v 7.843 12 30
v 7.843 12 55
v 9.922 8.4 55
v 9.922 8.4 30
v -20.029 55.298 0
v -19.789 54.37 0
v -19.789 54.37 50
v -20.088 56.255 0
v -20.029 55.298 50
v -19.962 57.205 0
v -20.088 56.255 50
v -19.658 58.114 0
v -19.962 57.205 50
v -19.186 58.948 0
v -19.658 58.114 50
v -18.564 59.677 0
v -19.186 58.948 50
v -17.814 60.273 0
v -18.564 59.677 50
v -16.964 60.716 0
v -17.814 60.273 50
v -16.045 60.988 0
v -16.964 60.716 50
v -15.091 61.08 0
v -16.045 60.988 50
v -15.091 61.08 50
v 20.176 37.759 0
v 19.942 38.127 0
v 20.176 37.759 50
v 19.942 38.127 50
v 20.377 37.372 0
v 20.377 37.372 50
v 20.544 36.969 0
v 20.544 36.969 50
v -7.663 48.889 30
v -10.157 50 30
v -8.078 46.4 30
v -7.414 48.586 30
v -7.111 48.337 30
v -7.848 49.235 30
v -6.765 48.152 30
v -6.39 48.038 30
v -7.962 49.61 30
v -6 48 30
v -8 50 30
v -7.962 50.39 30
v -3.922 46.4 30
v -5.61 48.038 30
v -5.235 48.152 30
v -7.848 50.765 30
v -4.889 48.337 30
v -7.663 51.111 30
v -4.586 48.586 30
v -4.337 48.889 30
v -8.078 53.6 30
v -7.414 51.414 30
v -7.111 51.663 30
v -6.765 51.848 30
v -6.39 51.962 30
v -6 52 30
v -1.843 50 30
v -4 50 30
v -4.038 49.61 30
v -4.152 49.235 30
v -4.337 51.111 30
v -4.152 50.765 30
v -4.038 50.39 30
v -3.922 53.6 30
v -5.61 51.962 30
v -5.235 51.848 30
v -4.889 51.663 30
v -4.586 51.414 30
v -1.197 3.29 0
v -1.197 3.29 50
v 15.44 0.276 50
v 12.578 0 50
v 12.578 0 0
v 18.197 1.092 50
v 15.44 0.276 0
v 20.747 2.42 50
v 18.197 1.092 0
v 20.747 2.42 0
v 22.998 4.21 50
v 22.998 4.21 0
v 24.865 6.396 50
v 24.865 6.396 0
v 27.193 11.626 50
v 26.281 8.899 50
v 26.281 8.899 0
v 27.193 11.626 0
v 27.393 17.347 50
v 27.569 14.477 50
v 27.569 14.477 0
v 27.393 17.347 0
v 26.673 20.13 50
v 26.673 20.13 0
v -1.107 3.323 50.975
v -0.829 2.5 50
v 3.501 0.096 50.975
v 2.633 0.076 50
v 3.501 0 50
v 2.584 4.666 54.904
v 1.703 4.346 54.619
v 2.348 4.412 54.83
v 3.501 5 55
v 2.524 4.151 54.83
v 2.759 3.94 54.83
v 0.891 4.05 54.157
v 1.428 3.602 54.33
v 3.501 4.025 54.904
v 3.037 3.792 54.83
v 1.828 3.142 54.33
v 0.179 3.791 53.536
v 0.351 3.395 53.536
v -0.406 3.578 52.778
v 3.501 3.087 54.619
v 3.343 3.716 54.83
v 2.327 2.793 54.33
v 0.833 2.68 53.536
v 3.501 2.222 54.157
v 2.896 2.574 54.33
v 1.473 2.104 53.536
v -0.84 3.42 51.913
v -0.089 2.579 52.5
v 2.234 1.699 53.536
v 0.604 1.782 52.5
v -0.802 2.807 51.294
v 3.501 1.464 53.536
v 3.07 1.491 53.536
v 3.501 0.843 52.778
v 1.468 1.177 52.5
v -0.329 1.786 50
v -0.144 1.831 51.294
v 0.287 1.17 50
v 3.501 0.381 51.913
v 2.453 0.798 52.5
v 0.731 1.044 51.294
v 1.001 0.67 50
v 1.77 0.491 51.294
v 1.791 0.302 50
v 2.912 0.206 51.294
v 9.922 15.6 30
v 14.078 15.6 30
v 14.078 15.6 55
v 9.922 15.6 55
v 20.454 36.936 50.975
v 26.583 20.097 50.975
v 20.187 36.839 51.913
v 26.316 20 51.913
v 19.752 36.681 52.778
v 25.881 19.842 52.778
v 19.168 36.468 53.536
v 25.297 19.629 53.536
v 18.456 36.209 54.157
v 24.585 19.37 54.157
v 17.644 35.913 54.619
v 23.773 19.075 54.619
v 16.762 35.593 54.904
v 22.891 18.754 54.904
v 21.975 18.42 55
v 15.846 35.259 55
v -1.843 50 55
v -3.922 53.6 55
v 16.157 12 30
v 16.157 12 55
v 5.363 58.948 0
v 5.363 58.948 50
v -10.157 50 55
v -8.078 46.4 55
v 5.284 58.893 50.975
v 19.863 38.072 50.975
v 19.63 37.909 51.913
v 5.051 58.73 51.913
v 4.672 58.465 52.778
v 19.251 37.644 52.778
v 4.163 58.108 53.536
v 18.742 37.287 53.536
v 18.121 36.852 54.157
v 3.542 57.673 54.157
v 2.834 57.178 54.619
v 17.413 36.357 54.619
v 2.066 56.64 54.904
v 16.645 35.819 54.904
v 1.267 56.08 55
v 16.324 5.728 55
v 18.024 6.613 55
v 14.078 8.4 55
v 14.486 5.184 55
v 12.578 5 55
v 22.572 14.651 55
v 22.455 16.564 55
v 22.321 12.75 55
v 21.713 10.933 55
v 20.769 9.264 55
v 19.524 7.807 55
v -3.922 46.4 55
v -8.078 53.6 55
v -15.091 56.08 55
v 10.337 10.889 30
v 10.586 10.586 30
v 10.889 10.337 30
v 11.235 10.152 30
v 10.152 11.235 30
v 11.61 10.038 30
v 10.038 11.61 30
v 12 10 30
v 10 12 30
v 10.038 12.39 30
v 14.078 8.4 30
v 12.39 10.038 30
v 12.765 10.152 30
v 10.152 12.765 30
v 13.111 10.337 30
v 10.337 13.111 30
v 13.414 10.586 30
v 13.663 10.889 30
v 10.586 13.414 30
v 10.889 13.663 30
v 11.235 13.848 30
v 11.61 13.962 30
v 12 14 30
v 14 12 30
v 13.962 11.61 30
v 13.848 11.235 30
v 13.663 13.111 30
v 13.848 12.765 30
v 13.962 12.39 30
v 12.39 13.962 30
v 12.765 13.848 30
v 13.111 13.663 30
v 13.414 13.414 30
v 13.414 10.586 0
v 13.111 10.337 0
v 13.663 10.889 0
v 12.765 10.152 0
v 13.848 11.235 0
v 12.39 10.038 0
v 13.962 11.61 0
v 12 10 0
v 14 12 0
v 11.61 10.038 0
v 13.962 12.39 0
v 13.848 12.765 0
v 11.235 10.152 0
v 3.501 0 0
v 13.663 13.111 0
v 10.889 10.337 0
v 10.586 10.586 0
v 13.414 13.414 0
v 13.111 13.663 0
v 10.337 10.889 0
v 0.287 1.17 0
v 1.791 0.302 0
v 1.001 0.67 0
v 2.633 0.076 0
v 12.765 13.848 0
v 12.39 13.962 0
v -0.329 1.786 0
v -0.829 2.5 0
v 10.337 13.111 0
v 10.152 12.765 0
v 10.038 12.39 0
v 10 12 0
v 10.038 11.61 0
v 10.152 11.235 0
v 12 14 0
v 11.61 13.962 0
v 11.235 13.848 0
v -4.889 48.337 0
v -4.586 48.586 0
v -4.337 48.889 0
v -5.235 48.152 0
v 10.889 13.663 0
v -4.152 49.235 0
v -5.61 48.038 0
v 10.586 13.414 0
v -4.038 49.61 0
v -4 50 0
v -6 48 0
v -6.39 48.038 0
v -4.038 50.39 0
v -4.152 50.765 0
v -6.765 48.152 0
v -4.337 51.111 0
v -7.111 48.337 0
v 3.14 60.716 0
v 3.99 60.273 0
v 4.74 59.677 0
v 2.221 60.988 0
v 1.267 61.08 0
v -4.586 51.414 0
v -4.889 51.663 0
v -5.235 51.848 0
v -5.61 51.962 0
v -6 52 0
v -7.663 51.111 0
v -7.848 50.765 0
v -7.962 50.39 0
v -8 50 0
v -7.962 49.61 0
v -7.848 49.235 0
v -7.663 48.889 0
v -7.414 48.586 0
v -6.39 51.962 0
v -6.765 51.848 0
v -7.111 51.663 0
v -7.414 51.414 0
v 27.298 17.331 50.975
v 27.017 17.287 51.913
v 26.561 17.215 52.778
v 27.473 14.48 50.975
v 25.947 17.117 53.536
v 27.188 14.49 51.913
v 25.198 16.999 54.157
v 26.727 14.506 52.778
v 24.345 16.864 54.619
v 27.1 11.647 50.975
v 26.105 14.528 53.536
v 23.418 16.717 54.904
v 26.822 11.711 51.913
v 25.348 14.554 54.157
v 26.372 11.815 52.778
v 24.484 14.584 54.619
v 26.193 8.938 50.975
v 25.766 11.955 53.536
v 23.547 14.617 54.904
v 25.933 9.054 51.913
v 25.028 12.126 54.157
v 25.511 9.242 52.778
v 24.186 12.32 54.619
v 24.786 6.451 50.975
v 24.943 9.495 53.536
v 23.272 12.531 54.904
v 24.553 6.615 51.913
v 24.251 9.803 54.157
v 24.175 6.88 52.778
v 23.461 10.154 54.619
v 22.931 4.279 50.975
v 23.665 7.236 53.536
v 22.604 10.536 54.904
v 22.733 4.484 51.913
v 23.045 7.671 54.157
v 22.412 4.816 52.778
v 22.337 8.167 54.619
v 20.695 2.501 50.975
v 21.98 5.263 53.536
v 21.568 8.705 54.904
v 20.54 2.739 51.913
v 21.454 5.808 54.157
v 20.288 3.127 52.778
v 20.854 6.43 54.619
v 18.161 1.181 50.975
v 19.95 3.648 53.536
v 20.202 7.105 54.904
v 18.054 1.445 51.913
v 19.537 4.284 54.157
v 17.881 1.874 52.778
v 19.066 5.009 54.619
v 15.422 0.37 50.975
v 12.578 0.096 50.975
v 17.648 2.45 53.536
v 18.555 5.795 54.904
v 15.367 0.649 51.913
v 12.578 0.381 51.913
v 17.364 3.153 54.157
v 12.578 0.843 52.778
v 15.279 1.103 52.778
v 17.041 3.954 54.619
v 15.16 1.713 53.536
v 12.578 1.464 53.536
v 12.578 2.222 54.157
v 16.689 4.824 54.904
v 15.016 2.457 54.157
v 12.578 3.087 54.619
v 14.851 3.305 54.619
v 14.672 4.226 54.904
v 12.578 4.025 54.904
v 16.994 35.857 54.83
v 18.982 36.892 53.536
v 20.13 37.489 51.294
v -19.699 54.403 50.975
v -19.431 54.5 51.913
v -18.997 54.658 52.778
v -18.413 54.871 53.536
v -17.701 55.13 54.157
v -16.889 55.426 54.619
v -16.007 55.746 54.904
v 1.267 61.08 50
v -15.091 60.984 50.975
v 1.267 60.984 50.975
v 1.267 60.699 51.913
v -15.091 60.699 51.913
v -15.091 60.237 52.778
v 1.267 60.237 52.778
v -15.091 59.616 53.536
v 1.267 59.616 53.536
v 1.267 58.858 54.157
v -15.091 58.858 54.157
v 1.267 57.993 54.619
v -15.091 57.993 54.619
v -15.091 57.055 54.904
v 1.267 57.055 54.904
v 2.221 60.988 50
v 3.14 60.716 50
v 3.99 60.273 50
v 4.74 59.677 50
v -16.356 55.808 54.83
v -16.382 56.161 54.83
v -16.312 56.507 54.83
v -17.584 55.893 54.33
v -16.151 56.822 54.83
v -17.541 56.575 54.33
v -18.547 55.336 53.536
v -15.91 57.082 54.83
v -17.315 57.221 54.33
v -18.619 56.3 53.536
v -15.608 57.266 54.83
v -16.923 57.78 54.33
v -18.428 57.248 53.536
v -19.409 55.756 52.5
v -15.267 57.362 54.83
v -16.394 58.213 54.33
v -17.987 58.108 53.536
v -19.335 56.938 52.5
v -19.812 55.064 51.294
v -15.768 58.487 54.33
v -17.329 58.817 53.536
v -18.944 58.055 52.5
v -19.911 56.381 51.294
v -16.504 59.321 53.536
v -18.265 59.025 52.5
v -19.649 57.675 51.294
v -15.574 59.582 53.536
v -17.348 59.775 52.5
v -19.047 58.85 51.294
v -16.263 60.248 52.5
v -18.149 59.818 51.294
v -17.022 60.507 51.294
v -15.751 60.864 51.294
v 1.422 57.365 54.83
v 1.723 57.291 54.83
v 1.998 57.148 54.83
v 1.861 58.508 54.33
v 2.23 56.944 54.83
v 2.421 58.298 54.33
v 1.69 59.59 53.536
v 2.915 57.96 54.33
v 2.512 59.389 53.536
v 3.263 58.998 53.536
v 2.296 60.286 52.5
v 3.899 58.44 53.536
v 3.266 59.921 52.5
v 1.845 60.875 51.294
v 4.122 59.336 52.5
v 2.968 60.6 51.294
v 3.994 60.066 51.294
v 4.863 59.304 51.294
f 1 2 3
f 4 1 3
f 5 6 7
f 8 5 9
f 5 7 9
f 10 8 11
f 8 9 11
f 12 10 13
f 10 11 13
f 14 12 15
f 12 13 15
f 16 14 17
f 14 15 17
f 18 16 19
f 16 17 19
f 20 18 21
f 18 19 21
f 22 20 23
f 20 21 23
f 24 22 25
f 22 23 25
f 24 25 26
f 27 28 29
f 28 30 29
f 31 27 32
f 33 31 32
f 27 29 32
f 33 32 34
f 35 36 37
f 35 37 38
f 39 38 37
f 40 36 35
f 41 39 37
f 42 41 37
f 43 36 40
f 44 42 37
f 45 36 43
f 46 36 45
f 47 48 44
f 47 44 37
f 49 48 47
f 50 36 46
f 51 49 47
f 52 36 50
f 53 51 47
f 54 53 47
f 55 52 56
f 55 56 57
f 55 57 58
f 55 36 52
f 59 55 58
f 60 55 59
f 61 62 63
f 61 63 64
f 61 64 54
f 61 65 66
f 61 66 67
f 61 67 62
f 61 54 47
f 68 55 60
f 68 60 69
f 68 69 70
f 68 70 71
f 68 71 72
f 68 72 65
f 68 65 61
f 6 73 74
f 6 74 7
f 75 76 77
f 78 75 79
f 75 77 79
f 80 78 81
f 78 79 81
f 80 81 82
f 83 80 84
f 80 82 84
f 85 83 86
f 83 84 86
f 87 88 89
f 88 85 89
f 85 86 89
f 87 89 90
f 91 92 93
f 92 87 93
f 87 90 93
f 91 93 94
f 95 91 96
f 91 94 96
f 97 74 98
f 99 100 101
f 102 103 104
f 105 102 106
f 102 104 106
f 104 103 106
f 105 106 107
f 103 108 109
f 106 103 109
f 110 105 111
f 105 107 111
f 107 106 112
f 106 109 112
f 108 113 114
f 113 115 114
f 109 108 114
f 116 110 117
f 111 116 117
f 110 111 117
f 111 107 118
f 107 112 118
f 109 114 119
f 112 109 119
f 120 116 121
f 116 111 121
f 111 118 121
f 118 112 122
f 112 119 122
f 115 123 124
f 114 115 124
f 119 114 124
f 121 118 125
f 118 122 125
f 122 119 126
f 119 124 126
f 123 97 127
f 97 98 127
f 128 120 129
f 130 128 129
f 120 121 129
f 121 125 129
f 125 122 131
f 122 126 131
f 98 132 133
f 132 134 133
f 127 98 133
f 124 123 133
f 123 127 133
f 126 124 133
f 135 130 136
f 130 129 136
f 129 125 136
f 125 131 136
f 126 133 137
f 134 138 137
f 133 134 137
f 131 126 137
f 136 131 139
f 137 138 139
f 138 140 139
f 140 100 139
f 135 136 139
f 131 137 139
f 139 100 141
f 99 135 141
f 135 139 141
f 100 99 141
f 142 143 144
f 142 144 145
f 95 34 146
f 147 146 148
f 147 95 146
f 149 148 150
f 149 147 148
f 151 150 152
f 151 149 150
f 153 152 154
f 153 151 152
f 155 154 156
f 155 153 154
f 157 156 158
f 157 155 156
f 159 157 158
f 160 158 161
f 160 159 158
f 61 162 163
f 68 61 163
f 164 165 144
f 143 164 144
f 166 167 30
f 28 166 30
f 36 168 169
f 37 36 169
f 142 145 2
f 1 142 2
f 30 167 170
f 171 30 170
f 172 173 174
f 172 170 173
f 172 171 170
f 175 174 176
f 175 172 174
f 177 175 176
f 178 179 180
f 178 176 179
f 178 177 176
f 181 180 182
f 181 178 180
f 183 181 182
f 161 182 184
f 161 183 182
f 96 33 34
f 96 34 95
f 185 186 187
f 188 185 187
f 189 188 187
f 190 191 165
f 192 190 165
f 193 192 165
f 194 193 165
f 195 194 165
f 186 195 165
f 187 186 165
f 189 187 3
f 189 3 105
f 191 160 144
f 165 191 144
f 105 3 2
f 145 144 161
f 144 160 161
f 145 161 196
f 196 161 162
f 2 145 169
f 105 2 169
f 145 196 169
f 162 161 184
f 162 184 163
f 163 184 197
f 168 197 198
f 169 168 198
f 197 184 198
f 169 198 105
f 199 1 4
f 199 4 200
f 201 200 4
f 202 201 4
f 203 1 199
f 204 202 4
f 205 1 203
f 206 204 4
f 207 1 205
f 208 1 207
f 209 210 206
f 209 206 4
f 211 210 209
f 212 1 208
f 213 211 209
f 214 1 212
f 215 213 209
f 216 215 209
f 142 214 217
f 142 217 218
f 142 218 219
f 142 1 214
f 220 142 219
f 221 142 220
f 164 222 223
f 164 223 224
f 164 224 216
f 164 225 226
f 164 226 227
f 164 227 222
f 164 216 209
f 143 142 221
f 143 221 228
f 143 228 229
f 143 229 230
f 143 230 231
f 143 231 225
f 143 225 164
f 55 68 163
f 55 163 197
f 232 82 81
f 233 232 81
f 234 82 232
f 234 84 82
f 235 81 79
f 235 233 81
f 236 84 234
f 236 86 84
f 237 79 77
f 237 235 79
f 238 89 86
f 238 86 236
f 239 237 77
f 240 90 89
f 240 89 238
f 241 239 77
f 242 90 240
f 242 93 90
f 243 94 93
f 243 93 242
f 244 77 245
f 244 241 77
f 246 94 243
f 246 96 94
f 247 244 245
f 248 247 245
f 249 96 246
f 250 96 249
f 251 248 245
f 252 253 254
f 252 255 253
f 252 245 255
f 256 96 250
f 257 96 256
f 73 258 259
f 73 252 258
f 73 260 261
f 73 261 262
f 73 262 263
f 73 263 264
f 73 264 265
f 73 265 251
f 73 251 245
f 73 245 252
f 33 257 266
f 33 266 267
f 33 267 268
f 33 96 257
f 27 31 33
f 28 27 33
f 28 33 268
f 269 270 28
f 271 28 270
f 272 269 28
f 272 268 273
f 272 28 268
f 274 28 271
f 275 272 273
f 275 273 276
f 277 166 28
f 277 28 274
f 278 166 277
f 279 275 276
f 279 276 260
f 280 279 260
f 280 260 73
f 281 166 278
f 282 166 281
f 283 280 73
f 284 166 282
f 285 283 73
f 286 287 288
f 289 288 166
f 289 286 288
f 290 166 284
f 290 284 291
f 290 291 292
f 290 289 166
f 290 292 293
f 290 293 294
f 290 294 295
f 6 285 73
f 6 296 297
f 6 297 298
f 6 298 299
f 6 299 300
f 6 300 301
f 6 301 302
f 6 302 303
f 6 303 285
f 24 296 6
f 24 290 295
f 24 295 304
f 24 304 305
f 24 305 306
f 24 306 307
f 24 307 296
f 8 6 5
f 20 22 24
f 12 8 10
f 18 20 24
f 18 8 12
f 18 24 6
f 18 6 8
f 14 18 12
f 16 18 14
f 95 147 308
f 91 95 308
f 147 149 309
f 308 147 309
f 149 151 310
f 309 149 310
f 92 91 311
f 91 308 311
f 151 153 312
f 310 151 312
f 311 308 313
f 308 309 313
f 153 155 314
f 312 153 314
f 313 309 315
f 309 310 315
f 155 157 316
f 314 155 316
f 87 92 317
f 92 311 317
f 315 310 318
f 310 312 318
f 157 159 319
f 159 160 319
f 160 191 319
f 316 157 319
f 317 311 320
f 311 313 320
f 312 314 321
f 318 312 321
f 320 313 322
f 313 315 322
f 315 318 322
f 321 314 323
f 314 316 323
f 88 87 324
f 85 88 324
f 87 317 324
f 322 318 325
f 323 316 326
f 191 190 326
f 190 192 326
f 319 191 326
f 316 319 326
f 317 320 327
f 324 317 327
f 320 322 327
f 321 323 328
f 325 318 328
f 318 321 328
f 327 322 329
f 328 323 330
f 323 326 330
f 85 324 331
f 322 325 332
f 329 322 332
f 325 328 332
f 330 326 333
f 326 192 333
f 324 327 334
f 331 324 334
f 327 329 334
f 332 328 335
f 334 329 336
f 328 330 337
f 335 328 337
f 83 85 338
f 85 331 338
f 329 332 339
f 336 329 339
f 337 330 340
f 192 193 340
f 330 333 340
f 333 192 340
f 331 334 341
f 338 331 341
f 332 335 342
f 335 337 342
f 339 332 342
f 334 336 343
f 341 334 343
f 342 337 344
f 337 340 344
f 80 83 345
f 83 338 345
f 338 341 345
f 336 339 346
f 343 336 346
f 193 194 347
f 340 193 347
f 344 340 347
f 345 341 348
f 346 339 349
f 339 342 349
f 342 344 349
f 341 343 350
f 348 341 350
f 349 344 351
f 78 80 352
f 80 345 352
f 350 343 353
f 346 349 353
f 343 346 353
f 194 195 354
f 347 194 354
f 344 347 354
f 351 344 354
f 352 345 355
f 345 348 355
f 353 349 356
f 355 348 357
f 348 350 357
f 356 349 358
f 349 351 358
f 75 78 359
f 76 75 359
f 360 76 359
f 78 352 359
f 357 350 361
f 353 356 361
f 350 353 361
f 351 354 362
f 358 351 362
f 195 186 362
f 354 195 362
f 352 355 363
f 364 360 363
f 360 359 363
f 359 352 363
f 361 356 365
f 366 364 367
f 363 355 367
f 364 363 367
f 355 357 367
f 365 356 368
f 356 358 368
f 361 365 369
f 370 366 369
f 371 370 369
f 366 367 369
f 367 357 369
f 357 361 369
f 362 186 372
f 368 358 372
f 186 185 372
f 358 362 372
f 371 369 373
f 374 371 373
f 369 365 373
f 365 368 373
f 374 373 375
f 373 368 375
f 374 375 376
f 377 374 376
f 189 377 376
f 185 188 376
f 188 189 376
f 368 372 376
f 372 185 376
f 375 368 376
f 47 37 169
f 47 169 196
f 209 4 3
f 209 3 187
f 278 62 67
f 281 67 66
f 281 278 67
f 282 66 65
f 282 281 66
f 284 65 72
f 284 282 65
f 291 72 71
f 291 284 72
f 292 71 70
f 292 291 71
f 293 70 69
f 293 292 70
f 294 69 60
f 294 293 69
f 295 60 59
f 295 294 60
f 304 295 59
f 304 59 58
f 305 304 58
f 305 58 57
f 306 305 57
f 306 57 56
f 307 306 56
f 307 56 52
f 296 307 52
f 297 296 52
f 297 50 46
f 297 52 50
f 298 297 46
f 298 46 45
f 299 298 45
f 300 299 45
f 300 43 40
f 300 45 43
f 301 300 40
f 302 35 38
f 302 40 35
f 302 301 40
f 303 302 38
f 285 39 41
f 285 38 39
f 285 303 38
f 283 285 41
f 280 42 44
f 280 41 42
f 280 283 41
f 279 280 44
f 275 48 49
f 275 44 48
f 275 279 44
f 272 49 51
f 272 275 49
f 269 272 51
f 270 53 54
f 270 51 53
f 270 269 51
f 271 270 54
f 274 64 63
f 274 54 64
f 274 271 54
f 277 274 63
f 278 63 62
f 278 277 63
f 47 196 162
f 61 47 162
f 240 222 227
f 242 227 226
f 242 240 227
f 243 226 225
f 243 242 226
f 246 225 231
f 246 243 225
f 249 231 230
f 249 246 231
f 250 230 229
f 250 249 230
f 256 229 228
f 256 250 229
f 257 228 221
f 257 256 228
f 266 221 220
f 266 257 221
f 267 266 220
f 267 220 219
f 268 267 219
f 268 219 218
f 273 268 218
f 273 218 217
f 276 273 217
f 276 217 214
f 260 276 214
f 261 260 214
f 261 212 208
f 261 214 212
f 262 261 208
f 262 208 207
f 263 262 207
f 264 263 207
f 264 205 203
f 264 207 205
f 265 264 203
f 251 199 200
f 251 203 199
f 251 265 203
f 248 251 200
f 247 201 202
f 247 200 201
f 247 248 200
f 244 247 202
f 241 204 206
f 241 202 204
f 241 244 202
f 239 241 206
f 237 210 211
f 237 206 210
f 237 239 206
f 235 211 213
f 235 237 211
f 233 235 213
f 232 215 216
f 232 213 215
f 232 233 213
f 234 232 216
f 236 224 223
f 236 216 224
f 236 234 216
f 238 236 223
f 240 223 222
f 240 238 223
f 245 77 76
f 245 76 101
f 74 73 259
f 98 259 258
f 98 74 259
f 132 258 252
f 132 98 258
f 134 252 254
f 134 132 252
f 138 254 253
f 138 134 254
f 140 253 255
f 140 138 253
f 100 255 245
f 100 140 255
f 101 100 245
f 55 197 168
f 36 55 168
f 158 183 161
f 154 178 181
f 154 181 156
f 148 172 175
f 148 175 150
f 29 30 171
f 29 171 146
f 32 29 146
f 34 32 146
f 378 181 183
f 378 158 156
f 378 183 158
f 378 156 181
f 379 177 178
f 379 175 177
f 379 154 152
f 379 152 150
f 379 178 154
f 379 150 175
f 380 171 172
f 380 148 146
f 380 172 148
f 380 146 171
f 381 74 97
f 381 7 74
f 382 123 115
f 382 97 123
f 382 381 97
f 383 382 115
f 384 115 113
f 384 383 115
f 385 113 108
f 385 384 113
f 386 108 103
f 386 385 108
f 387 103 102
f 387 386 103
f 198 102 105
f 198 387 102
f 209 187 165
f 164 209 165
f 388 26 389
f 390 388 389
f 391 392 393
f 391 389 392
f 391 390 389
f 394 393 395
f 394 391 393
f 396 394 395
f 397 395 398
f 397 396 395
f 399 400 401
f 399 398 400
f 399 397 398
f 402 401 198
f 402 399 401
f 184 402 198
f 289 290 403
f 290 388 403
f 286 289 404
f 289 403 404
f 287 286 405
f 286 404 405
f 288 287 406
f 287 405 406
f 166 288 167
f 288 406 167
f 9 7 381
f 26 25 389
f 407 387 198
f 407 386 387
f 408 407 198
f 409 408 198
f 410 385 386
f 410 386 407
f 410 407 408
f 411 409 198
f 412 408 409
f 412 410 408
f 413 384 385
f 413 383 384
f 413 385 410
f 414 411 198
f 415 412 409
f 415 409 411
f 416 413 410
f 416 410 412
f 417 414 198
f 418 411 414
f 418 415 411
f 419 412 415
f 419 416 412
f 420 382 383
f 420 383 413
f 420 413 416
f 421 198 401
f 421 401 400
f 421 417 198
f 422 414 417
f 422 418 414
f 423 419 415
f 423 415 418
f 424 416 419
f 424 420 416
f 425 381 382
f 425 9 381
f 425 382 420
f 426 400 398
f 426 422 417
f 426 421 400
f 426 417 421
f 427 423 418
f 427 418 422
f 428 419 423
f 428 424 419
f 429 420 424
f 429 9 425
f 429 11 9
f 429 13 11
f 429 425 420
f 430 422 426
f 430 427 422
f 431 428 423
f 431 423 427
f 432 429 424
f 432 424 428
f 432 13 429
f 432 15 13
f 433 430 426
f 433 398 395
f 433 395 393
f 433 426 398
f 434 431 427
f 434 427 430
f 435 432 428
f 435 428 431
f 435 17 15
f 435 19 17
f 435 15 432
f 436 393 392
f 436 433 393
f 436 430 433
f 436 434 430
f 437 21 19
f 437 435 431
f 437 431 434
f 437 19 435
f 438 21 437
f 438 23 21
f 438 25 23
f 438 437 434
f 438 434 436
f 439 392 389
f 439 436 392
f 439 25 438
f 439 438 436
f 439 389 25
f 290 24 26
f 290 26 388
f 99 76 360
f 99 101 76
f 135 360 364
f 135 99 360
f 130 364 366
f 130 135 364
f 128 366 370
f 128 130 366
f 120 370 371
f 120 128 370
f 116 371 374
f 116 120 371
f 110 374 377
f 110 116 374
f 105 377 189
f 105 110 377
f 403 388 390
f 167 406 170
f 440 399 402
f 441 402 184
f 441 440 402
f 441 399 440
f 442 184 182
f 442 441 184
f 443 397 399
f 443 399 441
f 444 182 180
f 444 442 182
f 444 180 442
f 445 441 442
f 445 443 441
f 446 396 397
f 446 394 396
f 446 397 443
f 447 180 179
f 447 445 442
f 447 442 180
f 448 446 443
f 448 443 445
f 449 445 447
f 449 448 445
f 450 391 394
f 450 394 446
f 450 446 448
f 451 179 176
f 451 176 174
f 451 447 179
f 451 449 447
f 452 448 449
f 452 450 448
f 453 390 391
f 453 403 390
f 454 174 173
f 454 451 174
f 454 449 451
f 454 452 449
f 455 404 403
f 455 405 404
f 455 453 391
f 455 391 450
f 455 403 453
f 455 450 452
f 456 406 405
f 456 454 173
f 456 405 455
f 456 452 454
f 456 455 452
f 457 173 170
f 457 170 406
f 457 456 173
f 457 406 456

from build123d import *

# Parameters (mm, degrees)
PAD001_DEPTH    = 55
FILLET002_R     = 5
SKETCH006_R     = 2
POCKET001_DEPTH = 55.001
POCKET002_START = 30
POCKET002_DEPTH = 70


with BuildPart() as part:
    # Sketch001 → Pad001 (new body)
    with BuildSketch(Plane.XY):
        with BuildLine():
            Line((0, 0), (-22.231309, 61.08002))
            Line((-22.231309, 61.08002), (3.869698, 61.08002))
            Line((3.869698, 61.08002), (20.319194, 37.587705))
            Line((20.319194, 37.587705), (26.673169, 20.130302))
            ThreePointArc((12.57778, 0), (24.865061, 6.396353), (26.673169, 20.130302))
            Line((12.57778, 0), (0, 0))
        make_face()
    extrude(amount=PAD001_DEPTH)

    # Fillet002
    fillet002_edges = [part.edges().sort_by_distance(p)[0] for p in [
        (20.319194, 37.587705, 27.5),
        (0, 0, 27.5),
        (3.869698, 61.08002, 27.5),
        (-22.231309, 61.08002, 27.5),
        (-11.115655, 30.54001, 55),
        (-9.180806, 61.08002, 55),
        (12.094446, 49.333863, 55),
        (23.496182, 28.859003, 55),
        (24.865061, 6.396353, 55),
        (6.28889, 0, 55),
    ]]
    fillet(fillet002_edges, radius=FILLET002_R)

    # Sketch006 → Pocket001 (cut, through all)
    with BuildSketch(Plane.XY):
        with Locations((12, 12)):
            Circle(SKETCH006_R)
        with Locations((-6, 50)):
            Circle(SKETCH006_R)
    extrude(amount=POCKET001_DEPTH, mode=Mode.SUBTRACT)

    # Sketch007 → Pocket002 (cut)
    with BuildSketch(Plane.XY.offset(POCKET002_START)):
        Polygon((14.078461, 15.6), (9.921539, 15.6), (7.843078, 12), (9.921539, 8.4), (14.078461, 8.4), (16.156922, 12), align=None)
        Polygon((-1.843078, 50), (-3.921539, 53.6), (-8.078461, 53.6), (-10.156922, 50), (-8.078461, 46.4), (-3.921539, 46.4), align=None)
    extrude(amount=POCKET002_DEPTH, mode=Mode.SUBTRACT)


solid = part.part
